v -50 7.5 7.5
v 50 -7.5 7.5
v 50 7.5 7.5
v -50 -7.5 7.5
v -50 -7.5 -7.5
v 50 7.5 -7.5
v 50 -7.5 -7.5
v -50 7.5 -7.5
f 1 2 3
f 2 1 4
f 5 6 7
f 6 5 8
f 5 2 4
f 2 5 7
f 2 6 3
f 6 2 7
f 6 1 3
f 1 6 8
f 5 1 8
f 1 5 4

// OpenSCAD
// Parameters
rail_length = 100.0; //[50.0:200.0:1]
rail_width = 15.0; //[7.5:30.0:0.5]
rail_height = 15.0; //[7.5:30.0:0.5]

// Rail Body Module
module rail_body() {
  color("Silver") // Aluminum-like appearance
  translate([0, 0, 0]) // Centered position
    cube([rail_length, rail_width, rail_height], center=true);
}

// Final Rail Model
rail_body();
